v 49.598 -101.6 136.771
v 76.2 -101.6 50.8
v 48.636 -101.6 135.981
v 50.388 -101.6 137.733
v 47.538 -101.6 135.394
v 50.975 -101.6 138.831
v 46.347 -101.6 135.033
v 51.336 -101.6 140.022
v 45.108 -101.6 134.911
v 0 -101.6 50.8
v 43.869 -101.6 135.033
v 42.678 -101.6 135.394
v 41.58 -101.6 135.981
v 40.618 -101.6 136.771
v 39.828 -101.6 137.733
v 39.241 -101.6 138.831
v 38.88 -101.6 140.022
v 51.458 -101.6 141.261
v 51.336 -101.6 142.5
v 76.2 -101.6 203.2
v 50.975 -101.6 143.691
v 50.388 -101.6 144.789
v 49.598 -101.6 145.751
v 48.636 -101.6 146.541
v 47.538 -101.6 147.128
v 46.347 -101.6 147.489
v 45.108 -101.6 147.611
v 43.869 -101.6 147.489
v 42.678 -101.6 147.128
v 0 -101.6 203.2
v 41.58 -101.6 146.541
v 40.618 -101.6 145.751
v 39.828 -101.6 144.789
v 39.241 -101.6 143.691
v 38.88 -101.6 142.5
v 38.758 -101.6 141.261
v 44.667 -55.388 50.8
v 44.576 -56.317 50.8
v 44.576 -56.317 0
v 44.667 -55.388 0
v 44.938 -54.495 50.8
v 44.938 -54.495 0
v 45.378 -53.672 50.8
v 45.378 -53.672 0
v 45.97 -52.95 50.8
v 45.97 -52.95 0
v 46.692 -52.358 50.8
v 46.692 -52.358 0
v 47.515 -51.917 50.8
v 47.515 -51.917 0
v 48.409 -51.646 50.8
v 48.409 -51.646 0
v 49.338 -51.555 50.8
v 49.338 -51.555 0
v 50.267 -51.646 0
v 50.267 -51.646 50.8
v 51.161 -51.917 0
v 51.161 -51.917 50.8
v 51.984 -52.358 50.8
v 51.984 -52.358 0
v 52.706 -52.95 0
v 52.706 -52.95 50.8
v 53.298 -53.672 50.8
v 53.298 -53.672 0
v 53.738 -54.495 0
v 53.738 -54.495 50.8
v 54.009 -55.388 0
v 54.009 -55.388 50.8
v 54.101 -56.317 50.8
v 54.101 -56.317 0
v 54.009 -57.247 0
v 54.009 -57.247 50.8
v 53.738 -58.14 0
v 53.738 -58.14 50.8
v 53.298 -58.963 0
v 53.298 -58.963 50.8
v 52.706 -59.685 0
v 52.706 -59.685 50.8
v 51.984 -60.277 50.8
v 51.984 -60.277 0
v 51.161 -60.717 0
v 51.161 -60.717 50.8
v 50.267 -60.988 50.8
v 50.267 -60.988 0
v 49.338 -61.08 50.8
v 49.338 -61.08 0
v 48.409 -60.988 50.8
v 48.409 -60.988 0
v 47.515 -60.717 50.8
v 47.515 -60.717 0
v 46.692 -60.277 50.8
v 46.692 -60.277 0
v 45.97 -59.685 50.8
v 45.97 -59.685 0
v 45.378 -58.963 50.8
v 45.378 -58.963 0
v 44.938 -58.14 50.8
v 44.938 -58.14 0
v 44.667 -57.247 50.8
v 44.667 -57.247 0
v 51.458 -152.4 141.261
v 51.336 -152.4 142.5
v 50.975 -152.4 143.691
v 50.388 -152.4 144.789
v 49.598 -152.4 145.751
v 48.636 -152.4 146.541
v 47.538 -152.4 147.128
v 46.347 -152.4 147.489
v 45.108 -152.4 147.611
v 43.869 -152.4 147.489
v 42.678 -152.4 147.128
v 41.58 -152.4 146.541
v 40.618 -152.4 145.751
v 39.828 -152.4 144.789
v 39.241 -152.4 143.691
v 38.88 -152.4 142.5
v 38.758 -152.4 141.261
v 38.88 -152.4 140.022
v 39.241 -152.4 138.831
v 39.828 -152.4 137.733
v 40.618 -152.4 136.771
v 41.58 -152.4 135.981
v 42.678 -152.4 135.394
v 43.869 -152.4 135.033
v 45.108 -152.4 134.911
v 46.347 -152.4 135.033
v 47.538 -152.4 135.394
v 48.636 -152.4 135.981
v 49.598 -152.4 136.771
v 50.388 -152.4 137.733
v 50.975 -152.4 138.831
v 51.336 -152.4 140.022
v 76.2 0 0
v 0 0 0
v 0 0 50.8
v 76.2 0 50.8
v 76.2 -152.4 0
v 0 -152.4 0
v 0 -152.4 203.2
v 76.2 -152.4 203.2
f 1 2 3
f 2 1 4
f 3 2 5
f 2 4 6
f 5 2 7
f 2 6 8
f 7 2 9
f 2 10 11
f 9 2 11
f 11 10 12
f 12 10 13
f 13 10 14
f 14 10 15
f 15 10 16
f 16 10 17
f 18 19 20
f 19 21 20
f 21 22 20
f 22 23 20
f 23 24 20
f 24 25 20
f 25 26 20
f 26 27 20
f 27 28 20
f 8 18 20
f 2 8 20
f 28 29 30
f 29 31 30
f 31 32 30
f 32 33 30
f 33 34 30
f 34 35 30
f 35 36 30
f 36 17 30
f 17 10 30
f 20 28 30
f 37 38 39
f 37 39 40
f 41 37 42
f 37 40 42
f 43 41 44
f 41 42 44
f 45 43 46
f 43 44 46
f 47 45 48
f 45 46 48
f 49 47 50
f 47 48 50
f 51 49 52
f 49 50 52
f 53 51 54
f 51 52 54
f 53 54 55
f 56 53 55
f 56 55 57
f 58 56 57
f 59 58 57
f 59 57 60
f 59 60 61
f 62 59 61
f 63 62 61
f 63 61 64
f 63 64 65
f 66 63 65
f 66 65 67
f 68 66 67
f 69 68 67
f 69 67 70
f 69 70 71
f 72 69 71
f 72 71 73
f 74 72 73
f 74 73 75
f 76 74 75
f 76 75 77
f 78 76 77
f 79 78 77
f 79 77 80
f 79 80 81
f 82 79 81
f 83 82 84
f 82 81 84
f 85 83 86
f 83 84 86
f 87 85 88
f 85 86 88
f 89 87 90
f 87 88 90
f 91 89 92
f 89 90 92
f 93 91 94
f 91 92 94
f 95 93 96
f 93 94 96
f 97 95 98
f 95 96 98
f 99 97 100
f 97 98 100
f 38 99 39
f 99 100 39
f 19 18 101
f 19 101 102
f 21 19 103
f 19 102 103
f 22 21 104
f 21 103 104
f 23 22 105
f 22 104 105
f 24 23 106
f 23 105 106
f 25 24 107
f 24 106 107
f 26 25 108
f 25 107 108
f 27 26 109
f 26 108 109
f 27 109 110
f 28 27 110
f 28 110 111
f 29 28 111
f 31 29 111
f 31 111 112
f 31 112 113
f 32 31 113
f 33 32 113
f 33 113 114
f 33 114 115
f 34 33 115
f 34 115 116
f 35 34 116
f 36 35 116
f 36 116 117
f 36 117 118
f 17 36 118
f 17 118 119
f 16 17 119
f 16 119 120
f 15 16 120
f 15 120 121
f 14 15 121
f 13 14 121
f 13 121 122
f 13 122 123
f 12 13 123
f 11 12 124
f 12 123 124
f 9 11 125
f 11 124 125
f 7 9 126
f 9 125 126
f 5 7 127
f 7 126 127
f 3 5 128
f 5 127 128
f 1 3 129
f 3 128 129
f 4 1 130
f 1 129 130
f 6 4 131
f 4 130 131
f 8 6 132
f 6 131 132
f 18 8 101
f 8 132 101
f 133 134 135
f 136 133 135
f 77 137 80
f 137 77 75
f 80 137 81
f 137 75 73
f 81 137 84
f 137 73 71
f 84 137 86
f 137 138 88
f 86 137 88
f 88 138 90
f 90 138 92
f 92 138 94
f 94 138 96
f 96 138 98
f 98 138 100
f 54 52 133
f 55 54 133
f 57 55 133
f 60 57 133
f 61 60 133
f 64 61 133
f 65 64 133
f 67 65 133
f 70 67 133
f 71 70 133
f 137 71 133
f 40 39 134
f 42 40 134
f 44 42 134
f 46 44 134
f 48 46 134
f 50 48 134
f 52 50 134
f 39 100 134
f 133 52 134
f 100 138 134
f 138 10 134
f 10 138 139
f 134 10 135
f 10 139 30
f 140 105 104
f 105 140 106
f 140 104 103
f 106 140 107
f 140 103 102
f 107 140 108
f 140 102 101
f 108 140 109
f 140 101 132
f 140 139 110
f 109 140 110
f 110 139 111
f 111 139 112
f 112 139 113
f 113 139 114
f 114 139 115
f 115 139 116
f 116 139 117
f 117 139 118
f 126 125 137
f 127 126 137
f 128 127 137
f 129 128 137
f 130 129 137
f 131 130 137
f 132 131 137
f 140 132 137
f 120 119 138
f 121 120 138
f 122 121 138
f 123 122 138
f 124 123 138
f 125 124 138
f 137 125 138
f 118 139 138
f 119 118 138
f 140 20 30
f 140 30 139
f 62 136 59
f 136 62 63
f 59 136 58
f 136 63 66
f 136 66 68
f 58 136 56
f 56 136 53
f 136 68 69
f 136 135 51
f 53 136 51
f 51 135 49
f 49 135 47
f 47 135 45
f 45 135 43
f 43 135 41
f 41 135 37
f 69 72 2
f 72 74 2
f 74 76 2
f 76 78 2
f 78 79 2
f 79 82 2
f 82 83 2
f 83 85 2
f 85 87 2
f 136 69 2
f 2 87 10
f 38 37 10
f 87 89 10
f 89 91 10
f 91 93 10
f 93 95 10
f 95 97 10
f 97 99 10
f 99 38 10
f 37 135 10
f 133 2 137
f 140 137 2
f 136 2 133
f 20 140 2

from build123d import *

# Parameters (mm, degrees)
F1_DEPTH = 76.2
F3_D     = 9.525
F5_D     = 12.7


with BuildPart() as f1:
    # F0 (on Right) → F1 (new body)
    with BuildSketch(Plane.YZ):
        Polygon((-152.4, 203.2), (-152.4, 0), (0, 0), (0, 50.8), (-101.6, 50.8), (-101.6, 203.2), align=None)
    extrude(amount=F1_DEPTH)

    # F3 (through all)
    with Locations(Plane.XY.offset(50.8)):
        with Locations((49.338017, -56.317471)):
            Hole(F3_D / 2)

    # F5 (through all)
    with Locations(Plane(origin=(0, -101.6, 0), x_dir=(-1, 0, 0), z_dir=(0, 1, 0))):
        with Locations((-45.108046, 141.260952)):
            Hole(F5_D / 2)


solid = f1.part
